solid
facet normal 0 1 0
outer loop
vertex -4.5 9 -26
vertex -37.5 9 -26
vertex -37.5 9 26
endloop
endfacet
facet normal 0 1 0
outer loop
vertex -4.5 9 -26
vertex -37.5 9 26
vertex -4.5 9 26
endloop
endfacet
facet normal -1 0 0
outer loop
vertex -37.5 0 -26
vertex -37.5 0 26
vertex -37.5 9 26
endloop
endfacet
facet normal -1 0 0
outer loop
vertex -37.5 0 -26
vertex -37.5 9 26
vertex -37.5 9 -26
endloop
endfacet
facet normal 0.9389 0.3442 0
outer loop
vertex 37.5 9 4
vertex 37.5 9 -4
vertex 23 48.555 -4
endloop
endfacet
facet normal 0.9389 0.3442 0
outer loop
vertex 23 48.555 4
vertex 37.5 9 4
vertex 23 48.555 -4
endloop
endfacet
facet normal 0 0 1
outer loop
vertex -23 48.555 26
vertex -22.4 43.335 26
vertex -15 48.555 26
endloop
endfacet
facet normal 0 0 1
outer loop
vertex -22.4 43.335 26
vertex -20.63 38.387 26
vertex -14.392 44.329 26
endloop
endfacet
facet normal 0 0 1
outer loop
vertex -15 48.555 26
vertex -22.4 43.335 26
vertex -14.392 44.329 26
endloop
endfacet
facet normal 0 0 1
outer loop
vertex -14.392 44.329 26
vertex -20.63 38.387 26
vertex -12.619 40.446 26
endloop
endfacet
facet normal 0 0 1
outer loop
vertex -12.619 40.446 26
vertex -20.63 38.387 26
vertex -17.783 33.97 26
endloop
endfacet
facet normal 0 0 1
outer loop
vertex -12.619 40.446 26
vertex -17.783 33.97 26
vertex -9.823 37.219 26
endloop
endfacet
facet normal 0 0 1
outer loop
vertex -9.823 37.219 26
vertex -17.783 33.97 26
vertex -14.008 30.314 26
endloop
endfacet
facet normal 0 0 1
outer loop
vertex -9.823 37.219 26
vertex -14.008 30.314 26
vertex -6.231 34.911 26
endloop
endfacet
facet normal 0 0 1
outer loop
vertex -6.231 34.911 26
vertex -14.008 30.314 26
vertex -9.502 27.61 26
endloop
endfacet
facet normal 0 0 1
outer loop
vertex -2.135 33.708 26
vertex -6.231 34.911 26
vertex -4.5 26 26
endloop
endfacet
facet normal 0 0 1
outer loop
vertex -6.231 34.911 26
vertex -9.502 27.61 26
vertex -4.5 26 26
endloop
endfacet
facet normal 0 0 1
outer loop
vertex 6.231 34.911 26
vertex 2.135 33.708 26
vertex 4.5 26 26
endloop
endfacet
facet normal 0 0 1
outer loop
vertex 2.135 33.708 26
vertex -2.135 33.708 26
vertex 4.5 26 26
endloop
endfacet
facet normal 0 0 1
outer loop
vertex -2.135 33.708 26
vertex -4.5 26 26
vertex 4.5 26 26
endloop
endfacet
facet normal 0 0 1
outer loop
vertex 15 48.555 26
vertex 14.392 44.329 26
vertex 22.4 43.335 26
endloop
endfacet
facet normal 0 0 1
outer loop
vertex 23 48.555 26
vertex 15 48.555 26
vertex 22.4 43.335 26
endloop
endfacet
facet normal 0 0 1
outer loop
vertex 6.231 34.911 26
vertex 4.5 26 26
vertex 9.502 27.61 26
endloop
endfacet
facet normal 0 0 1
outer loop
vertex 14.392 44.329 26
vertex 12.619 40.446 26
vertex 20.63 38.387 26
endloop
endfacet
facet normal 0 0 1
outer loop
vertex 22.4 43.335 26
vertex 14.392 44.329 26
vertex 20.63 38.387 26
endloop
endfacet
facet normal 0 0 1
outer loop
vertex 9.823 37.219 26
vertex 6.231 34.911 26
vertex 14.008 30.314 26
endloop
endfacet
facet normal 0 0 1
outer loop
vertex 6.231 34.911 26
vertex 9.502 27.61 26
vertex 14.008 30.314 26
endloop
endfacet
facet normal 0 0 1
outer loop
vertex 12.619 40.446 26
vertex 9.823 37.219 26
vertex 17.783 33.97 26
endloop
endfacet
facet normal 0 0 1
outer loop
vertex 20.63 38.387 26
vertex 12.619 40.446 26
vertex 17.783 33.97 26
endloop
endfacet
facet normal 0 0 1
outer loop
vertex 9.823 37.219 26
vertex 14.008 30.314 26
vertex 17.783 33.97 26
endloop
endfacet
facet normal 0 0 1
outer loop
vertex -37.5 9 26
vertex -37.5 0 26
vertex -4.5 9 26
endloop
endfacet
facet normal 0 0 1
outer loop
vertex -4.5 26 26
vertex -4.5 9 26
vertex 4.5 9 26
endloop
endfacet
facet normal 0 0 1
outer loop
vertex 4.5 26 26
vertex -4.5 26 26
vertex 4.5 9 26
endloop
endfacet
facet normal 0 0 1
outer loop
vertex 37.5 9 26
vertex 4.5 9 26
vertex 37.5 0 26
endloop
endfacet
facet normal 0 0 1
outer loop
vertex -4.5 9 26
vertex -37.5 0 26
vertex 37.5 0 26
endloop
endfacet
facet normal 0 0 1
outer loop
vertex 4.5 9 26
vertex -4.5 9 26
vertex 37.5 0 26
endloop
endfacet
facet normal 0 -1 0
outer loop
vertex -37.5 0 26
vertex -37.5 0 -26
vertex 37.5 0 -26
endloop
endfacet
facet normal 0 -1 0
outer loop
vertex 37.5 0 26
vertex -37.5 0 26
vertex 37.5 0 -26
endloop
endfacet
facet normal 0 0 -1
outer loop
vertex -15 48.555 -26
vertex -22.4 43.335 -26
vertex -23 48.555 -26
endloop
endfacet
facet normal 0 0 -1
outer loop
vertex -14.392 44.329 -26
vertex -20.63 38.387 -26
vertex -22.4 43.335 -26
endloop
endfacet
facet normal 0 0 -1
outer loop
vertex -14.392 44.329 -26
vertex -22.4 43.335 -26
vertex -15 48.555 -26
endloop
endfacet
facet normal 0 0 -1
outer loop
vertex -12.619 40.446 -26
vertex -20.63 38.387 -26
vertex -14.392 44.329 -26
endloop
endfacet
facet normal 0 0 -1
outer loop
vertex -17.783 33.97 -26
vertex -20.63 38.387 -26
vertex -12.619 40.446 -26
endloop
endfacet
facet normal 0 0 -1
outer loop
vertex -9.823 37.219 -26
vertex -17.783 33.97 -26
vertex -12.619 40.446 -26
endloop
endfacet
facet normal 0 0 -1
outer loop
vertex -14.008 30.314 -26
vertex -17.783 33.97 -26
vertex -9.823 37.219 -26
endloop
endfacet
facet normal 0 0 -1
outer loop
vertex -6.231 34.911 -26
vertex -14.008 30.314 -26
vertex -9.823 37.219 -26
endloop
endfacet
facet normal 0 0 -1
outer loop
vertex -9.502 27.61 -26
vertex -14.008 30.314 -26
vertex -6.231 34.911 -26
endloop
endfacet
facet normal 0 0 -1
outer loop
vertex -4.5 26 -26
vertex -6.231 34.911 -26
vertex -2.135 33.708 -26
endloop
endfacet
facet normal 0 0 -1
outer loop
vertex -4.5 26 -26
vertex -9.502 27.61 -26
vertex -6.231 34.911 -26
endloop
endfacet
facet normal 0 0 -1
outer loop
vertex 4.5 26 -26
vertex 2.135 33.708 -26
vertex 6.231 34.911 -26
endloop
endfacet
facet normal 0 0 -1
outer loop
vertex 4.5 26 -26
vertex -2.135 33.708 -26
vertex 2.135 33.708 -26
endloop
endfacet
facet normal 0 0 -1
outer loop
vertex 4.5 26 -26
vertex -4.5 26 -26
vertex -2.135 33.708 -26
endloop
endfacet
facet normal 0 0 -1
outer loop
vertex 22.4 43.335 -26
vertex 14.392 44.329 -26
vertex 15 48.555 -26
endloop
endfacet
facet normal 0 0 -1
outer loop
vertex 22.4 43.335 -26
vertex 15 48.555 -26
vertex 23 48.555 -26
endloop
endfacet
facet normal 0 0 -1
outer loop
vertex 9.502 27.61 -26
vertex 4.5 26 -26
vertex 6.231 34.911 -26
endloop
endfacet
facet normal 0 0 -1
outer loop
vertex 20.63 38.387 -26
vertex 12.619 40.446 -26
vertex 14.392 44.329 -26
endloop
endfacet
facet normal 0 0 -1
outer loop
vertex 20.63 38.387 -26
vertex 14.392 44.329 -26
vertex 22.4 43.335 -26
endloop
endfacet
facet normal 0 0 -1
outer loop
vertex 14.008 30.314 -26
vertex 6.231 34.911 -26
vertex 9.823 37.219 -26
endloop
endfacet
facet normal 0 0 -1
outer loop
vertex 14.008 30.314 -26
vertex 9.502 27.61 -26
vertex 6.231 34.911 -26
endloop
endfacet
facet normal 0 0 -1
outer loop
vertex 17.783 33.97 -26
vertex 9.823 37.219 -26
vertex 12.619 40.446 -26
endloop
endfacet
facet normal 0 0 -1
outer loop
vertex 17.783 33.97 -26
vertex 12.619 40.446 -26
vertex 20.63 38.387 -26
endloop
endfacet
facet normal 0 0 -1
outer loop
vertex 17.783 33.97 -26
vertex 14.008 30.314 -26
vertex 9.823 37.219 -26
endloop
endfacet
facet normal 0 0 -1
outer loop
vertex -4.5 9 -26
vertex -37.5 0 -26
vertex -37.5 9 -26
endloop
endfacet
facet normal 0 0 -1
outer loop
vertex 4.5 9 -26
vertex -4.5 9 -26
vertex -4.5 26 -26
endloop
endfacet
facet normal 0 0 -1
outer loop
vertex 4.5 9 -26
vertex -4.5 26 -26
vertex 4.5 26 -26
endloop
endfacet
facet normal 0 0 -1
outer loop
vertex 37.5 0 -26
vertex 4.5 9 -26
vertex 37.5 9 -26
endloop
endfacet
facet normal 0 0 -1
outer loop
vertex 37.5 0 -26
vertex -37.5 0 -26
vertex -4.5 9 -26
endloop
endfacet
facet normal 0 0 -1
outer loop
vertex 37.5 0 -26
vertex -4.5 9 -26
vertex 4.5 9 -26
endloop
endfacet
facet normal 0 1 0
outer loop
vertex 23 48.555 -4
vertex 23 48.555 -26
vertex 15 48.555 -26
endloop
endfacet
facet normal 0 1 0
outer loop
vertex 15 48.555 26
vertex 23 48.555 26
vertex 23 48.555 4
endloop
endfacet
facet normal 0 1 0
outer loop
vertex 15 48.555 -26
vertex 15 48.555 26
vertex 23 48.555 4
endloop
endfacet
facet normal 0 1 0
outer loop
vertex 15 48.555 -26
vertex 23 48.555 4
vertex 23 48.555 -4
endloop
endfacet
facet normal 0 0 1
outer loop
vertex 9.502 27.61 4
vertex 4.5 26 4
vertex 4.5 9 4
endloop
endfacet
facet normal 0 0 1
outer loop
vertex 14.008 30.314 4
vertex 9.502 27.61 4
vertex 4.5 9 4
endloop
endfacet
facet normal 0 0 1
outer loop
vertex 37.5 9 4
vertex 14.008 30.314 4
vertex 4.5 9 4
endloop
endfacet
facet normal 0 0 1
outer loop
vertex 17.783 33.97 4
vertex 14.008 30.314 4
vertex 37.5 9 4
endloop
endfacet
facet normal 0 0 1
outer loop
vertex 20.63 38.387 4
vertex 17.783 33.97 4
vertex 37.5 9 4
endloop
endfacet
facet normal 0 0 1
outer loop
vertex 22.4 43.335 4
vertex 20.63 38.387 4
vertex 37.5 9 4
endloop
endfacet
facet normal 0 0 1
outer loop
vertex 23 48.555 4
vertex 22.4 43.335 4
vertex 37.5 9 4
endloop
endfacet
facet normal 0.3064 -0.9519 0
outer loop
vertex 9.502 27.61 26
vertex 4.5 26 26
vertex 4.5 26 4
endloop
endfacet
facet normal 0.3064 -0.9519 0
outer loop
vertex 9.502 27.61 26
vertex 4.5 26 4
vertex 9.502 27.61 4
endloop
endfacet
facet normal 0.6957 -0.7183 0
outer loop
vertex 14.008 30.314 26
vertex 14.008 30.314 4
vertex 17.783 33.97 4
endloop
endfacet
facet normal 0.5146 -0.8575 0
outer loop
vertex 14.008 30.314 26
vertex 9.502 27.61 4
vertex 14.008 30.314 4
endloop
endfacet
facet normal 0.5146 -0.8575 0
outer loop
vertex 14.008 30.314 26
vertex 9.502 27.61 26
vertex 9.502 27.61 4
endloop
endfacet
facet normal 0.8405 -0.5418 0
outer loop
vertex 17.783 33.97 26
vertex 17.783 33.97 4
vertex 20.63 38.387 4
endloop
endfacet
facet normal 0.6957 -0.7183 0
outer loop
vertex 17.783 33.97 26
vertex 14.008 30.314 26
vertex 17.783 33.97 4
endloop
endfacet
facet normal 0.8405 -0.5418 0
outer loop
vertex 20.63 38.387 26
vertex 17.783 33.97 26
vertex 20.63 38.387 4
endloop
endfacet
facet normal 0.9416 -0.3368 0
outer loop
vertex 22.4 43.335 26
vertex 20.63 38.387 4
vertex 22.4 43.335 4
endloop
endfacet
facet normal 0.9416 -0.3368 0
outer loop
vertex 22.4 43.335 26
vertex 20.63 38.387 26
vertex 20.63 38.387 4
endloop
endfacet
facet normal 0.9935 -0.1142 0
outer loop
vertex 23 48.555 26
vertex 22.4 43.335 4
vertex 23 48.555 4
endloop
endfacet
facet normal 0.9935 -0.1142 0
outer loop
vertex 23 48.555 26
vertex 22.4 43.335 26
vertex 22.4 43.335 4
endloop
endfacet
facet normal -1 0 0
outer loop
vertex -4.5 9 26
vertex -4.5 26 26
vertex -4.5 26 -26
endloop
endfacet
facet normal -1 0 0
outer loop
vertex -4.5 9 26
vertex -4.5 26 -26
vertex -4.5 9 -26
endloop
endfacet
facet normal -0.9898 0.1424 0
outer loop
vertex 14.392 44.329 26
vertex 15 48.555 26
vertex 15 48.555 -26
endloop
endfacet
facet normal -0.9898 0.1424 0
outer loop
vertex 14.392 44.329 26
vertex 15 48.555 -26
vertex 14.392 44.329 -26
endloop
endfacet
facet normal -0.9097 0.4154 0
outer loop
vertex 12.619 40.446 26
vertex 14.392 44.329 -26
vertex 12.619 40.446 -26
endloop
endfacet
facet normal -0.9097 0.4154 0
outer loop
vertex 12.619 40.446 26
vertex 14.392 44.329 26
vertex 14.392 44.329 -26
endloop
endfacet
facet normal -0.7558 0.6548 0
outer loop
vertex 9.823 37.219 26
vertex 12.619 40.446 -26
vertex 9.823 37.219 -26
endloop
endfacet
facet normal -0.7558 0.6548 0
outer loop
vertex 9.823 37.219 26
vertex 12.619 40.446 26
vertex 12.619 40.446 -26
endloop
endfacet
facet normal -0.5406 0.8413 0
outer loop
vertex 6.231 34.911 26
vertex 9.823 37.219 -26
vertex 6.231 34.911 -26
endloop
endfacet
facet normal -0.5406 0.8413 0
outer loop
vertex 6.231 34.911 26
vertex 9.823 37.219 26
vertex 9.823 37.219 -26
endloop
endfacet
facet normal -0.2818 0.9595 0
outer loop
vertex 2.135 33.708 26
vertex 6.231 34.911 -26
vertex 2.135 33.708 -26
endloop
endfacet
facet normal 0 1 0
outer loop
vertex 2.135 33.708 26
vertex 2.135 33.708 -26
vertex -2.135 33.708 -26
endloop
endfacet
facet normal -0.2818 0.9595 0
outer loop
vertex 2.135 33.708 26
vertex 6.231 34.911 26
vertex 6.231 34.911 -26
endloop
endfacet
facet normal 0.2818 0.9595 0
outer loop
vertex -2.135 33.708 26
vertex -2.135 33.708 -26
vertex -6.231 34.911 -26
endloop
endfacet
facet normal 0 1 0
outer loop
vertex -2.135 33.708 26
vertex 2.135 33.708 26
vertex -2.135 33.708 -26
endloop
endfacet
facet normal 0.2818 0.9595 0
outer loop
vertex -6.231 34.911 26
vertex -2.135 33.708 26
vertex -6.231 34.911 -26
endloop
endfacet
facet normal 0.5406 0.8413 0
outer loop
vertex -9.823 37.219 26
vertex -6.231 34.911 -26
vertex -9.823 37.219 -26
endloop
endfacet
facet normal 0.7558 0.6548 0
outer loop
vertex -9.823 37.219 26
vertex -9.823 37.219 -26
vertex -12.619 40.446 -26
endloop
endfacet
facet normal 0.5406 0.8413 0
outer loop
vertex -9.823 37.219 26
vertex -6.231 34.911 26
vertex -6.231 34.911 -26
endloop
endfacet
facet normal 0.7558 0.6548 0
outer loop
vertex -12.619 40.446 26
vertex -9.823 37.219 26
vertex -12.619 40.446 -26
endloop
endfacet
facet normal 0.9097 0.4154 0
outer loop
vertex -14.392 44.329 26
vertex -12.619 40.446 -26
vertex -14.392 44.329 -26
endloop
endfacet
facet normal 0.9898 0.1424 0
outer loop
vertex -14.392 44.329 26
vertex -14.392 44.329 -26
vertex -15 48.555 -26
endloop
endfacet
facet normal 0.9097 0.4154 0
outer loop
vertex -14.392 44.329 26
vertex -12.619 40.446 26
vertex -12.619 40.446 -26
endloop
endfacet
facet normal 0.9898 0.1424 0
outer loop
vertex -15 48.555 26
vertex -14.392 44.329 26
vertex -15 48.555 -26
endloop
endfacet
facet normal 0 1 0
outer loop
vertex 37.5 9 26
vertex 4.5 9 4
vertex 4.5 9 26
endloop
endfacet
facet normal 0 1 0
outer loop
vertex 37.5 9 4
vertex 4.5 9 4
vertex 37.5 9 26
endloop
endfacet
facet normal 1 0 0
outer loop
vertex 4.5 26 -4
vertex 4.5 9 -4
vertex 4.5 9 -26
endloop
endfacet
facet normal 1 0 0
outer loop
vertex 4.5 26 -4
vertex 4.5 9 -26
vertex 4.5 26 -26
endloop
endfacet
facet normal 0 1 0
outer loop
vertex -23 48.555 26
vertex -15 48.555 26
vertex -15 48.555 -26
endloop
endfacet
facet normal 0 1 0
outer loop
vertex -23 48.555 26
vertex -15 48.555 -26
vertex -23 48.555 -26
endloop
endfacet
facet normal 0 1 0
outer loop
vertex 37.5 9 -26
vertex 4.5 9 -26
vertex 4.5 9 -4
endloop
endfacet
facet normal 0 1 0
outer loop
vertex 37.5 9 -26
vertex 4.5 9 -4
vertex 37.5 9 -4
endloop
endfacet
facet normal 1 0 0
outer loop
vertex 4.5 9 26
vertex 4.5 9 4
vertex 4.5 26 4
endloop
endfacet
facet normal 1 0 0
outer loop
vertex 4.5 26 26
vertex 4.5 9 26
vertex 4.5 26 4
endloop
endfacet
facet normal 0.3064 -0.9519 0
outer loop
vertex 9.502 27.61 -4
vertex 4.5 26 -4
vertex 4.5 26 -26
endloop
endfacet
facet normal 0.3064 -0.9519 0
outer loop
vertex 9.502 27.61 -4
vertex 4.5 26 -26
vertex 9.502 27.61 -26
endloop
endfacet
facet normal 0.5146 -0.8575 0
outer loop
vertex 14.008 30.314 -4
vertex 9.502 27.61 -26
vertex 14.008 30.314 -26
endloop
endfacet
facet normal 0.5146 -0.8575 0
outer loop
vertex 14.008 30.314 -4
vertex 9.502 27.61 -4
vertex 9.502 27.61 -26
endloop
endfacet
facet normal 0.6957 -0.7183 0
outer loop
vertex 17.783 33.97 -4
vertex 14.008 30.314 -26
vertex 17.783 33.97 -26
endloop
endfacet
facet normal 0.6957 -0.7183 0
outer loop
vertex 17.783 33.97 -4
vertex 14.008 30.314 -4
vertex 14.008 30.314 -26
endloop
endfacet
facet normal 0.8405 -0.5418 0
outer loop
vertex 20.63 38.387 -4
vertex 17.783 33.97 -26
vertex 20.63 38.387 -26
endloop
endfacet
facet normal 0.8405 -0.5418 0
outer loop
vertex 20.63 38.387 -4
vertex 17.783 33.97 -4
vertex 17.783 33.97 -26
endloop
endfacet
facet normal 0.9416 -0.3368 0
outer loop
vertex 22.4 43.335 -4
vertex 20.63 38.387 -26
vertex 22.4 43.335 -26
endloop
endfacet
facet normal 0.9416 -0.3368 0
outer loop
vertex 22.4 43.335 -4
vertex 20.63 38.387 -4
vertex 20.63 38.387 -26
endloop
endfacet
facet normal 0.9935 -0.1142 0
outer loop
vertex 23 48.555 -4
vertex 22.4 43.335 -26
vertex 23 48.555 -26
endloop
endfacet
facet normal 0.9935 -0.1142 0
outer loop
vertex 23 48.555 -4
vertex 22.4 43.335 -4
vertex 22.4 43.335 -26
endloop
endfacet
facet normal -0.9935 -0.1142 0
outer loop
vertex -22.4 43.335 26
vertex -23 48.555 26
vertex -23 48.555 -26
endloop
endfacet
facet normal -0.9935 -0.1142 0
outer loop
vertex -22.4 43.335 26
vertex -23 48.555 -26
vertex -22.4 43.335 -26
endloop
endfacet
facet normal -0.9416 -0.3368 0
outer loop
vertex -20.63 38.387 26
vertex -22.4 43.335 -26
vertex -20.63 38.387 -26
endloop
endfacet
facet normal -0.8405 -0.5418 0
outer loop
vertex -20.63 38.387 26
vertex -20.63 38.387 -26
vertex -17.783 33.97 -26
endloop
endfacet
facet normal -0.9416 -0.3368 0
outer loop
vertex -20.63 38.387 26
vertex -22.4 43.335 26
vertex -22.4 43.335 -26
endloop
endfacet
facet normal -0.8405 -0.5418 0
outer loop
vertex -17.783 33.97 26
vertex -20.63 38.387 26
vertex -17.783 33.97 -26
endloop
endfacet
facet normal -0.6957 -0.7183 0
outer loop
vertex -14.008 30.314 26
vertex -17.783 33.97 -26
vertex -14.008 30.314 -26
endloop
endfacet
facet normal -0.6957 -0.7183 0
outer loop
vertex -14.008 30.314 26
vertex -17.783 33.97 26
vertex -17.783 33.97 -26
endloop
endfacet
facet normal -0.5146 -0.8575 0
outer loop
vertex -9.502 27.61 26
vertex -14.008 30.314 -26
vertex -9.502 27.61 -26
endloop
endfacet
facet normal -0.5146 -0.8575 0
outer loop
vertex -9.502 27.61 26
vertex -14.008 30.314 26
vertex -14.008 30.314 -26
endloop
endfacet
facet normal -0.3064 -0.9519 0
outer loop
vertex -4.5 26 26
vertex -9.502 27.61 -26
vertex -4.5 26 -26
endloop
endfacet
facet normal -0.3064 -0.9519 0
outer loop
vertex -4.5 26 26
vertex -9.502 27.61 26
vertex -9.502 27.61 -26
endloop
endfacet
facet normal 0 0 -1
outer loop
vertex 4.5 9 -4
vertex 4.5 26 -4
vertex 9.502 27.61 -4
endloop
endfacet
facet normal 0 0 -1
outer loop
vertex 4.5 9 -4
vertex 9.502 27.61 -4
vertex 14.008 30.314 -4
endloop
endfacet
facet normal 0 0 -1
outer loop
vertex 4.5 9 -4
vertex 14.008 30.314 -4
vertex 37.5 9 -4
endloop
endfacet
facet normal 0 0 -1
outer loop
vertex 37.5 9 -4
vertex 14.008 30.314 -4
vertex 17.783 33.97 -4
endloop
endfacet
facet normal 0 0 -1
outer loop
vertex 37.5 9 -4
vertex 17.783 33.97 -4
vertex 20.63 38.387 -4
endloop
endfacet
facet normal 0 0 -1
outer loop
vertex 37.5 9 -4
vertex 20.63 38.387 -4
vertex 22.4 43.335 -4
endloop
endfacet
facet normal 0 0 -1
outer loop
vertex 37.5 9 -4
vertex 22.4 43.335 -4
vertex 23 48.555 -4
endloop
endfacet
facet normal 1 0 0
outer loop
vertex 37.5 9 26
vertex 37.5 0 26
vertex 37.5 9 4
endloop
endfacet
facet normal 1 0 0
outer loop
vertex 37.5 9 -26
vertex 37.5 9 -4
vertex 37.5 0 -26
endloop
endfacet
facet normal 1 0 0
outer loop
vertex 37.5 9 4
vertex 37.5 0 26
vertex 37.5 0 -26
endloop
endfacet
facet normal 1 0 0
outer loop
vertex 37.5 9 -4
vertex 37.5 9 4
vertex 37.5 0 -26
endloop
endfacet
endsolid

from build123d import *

# Parameters (mm, degrees)
SKETCH1_W                = 75
SKETCH1_H                = 52
BOSS_EXTRUDE1_DEPTH      = 9
BOSS_EXTRUDE2_DEPTH      = 52
BOSS_EXTRUDE3_DEPTH      = 4
BOSS_EXTRUDE3_DEPTH_BACK = 4


with BuildPart() as part:
    # Sketch1 → Boss-Extrude1 (new body)
    with BuildSketch(Plane(origin=(0, 0, 0), x_dir=(1, 0, 0), z_dir=(0, 1, 0))):
        Rectangle(SKETCH1_W, SKETCH1_H)
    extrude(amount=BOSS_EXTRUDE1_DEPTH)

    # Sketch2 → Boss-Extrude2 (add)
    with BuildSketch(Plane.XY.offset(26)):
        with BuildLine():
            Line((-4.5, 26), (-4.5, 9))
            Line((-4.5, 9), (4.5, 9))
            Line((4.5, 9), (4.5, 26))
            ThreePointArc((4.5, 26), (17.783419244, 33.969534991), (23, 48.555487137))
            Line((23, 48.555487137), (15, 48.555487137))
            ThreePointArc((15, 48.555487137), (0, 33.555487137), (-15, 48.555487137))
            Line((-15, 48.555487137), (-23, 48.555487137))
            ThreePointArc((-23, 48.555487137), (-17.783419244, 33.969534991), (-4.5, 26))
        make_face()
    extrude(amount=-BOSS_EXTRUDE2_DEPTH)

    # Sketch3 → Boss-Extrude3 (add, two sides: drawn at the far end of the back side and taken through both)
    with BuildSketch(Plane.XY.offset(-BOSS_EXTRUDE3_DEPTH_BACK)):
        with BuildLine():
            Line((4.5, 9), (37.5, 9))
            Line((37.5, 9), (23, 48.555487137))
            ThreePointArc((23, 48.555487137), (17.783419244, 33.969534991), (4.5, 26))
            Line((4.5, 26), (4.5, 9))
        make_face()
    extrude(amount=BOSS_EXTRUDE3_DEPTH + BOSS_EXTRUDE3_DEPTH_BACK)


solid = part.part
